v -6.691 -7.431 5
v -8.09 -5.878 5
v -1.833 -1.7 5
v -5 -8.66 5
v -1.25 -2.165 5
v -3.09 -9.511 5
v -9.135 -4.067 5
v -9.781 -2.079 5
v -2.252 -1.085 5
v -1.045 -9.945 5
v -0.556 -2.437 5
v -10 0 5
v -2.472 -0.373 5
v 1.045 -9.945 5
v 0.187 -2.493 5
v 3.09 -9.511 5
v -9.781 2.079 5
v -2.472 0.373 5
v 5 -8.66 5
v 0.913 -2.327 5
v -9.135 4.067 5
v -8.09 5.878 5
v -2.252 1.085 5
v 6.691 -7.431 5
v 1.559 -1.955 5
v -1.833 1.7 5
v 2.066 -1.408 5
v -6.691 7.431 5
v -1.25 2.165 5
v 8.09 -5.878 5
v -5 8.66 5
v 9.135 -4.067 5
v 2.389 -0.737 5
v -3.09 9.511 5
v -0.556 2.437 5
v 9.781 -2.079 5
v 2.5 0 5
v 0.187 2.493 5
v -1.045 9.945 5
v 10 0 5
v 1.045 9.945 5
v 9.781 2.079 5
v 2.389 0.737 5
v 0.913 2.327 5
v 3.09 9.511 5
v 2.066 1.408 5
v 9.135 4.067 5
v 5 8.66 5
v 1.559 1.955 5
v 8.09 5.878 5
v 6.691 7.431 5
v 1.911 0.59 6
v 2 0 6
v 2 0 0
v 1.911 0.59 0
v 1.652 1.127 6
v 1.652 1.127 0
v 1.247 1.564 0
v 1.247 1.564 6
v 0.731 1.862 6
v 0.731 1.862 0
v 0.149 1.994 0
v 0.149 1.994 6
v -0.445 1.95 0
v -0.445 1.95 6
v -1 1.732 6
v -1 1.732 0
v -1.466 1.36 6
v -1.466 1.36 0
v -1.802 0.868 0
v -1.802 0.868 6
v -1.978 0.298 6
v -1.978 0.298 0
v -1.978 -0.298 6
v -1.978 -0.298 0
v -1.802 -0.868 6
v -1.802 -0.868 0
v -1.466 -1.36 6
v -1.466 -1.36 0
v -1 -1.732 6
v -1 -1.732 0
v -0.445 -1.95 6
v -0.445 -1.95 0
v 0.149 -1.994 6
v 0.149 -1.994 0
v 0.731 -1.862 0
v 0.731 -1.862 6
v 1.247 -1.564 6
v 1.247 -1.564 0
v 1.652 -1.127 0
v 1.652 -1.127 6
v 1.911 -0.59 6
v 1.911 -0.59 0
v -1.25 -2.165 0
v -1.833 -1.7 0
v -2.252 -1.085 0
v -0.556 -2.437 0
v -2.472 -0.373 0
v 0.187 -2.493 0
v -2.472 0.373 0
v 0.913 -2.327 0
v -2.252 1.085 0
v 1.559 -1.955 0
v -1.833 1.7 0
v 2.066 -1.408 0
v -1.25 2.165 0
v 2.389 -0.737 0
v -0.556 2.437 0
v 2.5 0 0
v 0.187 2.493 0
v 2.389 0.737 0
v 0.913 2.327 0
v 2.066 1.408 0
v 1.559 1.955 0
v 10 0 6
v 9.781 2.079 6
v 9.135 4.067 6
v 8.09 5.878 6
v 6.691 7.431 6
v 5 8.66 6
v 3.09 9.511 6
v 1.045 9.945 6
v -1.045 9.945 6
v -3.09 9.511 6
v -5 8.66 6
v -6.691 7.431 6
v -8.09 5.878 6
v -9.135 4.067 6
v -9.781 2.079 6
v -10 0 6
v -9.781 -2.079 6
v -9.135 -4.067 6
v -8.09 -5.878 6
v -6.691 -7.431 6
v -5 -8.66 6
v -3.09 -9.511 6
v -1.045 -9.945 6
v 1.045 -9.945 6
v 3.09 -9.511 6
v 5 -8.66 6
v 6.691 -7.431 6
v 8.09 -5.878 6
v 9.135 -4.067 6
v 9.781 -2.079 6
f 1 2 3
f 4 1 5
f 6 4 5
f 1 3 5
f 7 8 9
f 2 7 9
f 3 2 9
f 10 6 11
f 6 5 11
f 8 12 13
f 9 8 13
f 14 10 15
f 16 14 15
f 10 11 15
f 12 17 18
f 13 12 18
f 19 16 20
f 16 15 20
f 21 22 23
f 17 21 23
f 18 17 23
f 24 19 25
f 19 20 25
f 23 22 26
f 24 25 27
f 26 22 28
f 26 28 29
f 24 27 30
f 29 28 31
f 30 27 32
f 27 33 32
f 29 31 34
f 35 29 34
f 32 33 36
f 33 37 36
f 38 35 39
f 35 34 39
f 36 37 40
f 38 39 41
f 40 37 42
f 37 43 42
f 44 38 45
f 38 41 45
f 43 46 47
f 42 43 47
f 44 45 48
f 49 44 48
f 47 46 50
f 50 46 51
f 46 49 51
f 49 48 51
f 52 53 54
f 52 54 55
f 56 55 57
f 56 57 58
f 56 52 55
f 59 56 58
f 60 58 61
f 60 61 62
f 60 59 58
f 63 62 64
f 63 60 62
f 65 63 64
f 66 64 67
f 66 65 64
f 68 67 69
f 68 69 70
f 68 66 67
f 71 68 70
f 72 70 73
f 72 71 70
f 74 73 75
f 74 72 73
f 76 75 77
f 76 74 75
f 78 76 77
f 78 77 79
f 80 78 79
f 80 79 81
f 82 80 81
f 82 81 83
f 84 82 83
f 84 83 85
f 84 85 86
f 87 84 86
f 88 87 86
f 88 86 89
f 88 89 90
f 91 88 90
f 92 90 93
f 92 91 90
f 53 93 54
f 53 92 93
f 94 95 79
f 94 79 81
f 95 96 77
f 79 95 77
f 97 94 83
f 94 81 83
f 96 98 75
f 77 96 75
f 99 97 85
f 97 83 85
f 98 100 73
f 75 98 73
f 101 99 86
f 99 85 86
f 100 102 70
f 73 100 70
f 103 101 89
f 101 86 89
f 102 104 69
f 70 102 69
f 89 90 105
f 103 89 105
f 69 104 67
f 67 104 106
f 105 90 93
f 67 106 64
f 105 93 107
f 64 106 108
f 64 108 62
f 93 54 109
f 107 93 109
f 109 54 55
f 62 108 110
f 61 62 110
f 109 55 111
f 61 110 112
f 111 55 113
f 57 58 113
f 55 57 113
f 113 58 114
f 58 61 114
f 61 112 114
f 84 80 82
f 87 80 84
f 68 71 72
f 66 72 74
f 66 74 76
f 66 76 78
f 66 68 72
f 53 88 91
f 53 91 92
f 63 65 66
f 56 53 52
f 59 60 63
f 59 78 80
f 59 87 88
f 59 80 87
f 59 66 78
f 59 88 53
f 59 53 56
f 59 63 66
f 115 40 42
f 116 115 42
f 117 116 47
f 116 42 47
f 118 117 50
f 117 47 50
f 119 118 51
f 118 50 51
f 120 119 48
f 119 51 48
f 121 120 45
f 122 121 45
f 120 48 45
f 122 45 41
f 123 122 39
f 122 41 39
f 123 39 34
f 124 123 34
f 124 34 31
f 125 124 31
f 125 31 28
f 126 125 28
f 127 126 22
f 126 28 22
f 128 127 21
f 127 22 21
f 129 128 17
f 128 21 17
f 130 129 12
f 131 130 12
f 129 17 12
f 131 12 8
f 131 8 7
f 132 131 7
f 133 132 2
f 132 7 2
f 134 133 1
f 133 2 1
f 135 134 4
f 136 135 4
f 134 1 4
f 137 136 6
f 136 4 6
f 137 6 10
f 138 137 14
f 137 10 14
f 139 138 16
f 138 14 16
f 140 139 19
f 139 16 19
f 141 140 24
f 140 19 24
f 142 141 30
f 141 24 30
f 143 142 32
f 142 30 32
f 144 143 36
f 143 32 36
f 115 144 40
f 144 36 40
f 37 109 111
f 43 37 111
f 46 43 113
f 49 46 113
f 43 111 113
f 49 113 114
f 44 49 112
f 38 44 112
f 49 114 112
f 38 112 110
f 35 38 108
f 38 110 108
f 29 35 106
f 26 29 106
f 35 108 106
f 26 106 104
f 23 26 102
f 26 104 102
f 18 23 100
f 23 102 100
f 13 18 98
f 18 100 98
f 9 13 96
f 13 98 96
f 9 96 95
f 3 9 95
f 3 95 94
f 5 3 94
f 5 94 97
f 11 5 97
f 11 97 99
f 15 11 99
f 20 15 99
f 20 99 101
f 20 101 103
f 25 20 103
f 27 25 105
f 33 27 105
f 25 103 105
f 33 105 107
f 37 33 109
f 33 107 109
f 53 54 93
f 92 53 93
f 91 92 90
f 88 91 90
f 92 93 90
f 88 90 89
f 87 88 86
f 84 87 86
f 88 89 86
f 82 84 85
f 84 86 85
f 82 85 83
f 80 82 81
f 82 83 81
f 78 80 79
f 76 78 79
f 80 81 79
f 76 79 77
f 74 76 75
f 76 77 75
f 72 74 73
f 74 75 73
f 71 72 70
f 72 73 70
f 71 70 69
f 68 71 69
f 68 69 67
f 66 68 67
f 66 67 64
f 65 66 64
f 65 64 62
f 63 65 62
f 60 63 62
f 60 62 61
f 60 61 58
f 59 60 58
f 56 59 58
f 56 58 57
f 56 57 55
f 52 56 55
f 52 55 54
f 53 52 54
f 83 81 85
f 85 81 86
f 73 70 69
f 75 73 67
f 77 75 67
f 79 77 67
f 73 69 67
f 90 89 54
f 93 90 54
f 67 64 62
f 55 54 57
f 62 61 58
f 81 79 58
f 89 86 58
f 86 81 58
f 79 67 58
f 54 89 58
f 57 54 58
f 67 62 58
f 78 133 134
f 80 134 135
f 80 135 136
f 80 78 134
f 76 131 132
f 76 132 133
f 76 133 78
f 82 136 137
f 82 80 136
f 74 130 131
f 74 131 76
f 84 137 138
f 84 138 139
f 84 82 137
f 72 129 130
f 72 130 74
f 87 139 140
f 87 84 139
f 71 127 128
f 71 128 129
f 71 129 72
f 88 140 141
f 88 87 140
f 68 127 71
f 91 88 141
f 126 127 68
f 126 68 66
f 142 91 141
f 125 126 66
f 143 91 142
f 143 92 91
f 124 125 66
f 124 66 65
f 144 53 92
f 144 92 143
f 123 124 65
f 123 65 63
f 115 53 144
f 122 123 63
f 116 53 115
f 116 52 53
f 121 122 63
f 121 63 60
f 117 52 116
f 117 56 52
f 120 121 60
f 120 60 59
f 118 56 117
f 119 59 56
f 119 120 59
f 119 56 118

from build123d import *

# Parameters (mm, degrees)
F0_R     = 2.5
F1_DEPTH = 5
F2_R     = 10
F3_DEPTH = 1
F4_R     = 2
F5_DEPTH = 25
F6_R     = 2
F7_DEPTH = 6


with BuildPart() as f1:
    # F0 (on Top) → F1 (new body)
    with BuildSketch(Plane.XY):
        Circle(F0_R)
    extrude(amount=F1_DEPTH)

    # F2 (on face) → F3 (join)
    with BuildSketch(Plane.XY.offset(5)):
        Circle(F2_R)
    extrude(amount=F3_DEPTH)

    # F4 (on face) → F5 (cut)
    with BuildSketch(Plane(origin=(0, 0, 0), x_dir=(1, 0, 0), z_dir=(0, 0, -1))):
        Circle(F4_R)
    extrude(amount=-F5_DEPTH, mode=Mode.SUBTRACT)


with BuildPart() as f7:
    # F6 (on face) → F7 (new body)
    with BuildSketch(Plane.XY.offset(6)):
        Circle(F6_R)
    extrude(amount=-F7_DEPTH)


solid = Compound([f1.part, f7.part])
